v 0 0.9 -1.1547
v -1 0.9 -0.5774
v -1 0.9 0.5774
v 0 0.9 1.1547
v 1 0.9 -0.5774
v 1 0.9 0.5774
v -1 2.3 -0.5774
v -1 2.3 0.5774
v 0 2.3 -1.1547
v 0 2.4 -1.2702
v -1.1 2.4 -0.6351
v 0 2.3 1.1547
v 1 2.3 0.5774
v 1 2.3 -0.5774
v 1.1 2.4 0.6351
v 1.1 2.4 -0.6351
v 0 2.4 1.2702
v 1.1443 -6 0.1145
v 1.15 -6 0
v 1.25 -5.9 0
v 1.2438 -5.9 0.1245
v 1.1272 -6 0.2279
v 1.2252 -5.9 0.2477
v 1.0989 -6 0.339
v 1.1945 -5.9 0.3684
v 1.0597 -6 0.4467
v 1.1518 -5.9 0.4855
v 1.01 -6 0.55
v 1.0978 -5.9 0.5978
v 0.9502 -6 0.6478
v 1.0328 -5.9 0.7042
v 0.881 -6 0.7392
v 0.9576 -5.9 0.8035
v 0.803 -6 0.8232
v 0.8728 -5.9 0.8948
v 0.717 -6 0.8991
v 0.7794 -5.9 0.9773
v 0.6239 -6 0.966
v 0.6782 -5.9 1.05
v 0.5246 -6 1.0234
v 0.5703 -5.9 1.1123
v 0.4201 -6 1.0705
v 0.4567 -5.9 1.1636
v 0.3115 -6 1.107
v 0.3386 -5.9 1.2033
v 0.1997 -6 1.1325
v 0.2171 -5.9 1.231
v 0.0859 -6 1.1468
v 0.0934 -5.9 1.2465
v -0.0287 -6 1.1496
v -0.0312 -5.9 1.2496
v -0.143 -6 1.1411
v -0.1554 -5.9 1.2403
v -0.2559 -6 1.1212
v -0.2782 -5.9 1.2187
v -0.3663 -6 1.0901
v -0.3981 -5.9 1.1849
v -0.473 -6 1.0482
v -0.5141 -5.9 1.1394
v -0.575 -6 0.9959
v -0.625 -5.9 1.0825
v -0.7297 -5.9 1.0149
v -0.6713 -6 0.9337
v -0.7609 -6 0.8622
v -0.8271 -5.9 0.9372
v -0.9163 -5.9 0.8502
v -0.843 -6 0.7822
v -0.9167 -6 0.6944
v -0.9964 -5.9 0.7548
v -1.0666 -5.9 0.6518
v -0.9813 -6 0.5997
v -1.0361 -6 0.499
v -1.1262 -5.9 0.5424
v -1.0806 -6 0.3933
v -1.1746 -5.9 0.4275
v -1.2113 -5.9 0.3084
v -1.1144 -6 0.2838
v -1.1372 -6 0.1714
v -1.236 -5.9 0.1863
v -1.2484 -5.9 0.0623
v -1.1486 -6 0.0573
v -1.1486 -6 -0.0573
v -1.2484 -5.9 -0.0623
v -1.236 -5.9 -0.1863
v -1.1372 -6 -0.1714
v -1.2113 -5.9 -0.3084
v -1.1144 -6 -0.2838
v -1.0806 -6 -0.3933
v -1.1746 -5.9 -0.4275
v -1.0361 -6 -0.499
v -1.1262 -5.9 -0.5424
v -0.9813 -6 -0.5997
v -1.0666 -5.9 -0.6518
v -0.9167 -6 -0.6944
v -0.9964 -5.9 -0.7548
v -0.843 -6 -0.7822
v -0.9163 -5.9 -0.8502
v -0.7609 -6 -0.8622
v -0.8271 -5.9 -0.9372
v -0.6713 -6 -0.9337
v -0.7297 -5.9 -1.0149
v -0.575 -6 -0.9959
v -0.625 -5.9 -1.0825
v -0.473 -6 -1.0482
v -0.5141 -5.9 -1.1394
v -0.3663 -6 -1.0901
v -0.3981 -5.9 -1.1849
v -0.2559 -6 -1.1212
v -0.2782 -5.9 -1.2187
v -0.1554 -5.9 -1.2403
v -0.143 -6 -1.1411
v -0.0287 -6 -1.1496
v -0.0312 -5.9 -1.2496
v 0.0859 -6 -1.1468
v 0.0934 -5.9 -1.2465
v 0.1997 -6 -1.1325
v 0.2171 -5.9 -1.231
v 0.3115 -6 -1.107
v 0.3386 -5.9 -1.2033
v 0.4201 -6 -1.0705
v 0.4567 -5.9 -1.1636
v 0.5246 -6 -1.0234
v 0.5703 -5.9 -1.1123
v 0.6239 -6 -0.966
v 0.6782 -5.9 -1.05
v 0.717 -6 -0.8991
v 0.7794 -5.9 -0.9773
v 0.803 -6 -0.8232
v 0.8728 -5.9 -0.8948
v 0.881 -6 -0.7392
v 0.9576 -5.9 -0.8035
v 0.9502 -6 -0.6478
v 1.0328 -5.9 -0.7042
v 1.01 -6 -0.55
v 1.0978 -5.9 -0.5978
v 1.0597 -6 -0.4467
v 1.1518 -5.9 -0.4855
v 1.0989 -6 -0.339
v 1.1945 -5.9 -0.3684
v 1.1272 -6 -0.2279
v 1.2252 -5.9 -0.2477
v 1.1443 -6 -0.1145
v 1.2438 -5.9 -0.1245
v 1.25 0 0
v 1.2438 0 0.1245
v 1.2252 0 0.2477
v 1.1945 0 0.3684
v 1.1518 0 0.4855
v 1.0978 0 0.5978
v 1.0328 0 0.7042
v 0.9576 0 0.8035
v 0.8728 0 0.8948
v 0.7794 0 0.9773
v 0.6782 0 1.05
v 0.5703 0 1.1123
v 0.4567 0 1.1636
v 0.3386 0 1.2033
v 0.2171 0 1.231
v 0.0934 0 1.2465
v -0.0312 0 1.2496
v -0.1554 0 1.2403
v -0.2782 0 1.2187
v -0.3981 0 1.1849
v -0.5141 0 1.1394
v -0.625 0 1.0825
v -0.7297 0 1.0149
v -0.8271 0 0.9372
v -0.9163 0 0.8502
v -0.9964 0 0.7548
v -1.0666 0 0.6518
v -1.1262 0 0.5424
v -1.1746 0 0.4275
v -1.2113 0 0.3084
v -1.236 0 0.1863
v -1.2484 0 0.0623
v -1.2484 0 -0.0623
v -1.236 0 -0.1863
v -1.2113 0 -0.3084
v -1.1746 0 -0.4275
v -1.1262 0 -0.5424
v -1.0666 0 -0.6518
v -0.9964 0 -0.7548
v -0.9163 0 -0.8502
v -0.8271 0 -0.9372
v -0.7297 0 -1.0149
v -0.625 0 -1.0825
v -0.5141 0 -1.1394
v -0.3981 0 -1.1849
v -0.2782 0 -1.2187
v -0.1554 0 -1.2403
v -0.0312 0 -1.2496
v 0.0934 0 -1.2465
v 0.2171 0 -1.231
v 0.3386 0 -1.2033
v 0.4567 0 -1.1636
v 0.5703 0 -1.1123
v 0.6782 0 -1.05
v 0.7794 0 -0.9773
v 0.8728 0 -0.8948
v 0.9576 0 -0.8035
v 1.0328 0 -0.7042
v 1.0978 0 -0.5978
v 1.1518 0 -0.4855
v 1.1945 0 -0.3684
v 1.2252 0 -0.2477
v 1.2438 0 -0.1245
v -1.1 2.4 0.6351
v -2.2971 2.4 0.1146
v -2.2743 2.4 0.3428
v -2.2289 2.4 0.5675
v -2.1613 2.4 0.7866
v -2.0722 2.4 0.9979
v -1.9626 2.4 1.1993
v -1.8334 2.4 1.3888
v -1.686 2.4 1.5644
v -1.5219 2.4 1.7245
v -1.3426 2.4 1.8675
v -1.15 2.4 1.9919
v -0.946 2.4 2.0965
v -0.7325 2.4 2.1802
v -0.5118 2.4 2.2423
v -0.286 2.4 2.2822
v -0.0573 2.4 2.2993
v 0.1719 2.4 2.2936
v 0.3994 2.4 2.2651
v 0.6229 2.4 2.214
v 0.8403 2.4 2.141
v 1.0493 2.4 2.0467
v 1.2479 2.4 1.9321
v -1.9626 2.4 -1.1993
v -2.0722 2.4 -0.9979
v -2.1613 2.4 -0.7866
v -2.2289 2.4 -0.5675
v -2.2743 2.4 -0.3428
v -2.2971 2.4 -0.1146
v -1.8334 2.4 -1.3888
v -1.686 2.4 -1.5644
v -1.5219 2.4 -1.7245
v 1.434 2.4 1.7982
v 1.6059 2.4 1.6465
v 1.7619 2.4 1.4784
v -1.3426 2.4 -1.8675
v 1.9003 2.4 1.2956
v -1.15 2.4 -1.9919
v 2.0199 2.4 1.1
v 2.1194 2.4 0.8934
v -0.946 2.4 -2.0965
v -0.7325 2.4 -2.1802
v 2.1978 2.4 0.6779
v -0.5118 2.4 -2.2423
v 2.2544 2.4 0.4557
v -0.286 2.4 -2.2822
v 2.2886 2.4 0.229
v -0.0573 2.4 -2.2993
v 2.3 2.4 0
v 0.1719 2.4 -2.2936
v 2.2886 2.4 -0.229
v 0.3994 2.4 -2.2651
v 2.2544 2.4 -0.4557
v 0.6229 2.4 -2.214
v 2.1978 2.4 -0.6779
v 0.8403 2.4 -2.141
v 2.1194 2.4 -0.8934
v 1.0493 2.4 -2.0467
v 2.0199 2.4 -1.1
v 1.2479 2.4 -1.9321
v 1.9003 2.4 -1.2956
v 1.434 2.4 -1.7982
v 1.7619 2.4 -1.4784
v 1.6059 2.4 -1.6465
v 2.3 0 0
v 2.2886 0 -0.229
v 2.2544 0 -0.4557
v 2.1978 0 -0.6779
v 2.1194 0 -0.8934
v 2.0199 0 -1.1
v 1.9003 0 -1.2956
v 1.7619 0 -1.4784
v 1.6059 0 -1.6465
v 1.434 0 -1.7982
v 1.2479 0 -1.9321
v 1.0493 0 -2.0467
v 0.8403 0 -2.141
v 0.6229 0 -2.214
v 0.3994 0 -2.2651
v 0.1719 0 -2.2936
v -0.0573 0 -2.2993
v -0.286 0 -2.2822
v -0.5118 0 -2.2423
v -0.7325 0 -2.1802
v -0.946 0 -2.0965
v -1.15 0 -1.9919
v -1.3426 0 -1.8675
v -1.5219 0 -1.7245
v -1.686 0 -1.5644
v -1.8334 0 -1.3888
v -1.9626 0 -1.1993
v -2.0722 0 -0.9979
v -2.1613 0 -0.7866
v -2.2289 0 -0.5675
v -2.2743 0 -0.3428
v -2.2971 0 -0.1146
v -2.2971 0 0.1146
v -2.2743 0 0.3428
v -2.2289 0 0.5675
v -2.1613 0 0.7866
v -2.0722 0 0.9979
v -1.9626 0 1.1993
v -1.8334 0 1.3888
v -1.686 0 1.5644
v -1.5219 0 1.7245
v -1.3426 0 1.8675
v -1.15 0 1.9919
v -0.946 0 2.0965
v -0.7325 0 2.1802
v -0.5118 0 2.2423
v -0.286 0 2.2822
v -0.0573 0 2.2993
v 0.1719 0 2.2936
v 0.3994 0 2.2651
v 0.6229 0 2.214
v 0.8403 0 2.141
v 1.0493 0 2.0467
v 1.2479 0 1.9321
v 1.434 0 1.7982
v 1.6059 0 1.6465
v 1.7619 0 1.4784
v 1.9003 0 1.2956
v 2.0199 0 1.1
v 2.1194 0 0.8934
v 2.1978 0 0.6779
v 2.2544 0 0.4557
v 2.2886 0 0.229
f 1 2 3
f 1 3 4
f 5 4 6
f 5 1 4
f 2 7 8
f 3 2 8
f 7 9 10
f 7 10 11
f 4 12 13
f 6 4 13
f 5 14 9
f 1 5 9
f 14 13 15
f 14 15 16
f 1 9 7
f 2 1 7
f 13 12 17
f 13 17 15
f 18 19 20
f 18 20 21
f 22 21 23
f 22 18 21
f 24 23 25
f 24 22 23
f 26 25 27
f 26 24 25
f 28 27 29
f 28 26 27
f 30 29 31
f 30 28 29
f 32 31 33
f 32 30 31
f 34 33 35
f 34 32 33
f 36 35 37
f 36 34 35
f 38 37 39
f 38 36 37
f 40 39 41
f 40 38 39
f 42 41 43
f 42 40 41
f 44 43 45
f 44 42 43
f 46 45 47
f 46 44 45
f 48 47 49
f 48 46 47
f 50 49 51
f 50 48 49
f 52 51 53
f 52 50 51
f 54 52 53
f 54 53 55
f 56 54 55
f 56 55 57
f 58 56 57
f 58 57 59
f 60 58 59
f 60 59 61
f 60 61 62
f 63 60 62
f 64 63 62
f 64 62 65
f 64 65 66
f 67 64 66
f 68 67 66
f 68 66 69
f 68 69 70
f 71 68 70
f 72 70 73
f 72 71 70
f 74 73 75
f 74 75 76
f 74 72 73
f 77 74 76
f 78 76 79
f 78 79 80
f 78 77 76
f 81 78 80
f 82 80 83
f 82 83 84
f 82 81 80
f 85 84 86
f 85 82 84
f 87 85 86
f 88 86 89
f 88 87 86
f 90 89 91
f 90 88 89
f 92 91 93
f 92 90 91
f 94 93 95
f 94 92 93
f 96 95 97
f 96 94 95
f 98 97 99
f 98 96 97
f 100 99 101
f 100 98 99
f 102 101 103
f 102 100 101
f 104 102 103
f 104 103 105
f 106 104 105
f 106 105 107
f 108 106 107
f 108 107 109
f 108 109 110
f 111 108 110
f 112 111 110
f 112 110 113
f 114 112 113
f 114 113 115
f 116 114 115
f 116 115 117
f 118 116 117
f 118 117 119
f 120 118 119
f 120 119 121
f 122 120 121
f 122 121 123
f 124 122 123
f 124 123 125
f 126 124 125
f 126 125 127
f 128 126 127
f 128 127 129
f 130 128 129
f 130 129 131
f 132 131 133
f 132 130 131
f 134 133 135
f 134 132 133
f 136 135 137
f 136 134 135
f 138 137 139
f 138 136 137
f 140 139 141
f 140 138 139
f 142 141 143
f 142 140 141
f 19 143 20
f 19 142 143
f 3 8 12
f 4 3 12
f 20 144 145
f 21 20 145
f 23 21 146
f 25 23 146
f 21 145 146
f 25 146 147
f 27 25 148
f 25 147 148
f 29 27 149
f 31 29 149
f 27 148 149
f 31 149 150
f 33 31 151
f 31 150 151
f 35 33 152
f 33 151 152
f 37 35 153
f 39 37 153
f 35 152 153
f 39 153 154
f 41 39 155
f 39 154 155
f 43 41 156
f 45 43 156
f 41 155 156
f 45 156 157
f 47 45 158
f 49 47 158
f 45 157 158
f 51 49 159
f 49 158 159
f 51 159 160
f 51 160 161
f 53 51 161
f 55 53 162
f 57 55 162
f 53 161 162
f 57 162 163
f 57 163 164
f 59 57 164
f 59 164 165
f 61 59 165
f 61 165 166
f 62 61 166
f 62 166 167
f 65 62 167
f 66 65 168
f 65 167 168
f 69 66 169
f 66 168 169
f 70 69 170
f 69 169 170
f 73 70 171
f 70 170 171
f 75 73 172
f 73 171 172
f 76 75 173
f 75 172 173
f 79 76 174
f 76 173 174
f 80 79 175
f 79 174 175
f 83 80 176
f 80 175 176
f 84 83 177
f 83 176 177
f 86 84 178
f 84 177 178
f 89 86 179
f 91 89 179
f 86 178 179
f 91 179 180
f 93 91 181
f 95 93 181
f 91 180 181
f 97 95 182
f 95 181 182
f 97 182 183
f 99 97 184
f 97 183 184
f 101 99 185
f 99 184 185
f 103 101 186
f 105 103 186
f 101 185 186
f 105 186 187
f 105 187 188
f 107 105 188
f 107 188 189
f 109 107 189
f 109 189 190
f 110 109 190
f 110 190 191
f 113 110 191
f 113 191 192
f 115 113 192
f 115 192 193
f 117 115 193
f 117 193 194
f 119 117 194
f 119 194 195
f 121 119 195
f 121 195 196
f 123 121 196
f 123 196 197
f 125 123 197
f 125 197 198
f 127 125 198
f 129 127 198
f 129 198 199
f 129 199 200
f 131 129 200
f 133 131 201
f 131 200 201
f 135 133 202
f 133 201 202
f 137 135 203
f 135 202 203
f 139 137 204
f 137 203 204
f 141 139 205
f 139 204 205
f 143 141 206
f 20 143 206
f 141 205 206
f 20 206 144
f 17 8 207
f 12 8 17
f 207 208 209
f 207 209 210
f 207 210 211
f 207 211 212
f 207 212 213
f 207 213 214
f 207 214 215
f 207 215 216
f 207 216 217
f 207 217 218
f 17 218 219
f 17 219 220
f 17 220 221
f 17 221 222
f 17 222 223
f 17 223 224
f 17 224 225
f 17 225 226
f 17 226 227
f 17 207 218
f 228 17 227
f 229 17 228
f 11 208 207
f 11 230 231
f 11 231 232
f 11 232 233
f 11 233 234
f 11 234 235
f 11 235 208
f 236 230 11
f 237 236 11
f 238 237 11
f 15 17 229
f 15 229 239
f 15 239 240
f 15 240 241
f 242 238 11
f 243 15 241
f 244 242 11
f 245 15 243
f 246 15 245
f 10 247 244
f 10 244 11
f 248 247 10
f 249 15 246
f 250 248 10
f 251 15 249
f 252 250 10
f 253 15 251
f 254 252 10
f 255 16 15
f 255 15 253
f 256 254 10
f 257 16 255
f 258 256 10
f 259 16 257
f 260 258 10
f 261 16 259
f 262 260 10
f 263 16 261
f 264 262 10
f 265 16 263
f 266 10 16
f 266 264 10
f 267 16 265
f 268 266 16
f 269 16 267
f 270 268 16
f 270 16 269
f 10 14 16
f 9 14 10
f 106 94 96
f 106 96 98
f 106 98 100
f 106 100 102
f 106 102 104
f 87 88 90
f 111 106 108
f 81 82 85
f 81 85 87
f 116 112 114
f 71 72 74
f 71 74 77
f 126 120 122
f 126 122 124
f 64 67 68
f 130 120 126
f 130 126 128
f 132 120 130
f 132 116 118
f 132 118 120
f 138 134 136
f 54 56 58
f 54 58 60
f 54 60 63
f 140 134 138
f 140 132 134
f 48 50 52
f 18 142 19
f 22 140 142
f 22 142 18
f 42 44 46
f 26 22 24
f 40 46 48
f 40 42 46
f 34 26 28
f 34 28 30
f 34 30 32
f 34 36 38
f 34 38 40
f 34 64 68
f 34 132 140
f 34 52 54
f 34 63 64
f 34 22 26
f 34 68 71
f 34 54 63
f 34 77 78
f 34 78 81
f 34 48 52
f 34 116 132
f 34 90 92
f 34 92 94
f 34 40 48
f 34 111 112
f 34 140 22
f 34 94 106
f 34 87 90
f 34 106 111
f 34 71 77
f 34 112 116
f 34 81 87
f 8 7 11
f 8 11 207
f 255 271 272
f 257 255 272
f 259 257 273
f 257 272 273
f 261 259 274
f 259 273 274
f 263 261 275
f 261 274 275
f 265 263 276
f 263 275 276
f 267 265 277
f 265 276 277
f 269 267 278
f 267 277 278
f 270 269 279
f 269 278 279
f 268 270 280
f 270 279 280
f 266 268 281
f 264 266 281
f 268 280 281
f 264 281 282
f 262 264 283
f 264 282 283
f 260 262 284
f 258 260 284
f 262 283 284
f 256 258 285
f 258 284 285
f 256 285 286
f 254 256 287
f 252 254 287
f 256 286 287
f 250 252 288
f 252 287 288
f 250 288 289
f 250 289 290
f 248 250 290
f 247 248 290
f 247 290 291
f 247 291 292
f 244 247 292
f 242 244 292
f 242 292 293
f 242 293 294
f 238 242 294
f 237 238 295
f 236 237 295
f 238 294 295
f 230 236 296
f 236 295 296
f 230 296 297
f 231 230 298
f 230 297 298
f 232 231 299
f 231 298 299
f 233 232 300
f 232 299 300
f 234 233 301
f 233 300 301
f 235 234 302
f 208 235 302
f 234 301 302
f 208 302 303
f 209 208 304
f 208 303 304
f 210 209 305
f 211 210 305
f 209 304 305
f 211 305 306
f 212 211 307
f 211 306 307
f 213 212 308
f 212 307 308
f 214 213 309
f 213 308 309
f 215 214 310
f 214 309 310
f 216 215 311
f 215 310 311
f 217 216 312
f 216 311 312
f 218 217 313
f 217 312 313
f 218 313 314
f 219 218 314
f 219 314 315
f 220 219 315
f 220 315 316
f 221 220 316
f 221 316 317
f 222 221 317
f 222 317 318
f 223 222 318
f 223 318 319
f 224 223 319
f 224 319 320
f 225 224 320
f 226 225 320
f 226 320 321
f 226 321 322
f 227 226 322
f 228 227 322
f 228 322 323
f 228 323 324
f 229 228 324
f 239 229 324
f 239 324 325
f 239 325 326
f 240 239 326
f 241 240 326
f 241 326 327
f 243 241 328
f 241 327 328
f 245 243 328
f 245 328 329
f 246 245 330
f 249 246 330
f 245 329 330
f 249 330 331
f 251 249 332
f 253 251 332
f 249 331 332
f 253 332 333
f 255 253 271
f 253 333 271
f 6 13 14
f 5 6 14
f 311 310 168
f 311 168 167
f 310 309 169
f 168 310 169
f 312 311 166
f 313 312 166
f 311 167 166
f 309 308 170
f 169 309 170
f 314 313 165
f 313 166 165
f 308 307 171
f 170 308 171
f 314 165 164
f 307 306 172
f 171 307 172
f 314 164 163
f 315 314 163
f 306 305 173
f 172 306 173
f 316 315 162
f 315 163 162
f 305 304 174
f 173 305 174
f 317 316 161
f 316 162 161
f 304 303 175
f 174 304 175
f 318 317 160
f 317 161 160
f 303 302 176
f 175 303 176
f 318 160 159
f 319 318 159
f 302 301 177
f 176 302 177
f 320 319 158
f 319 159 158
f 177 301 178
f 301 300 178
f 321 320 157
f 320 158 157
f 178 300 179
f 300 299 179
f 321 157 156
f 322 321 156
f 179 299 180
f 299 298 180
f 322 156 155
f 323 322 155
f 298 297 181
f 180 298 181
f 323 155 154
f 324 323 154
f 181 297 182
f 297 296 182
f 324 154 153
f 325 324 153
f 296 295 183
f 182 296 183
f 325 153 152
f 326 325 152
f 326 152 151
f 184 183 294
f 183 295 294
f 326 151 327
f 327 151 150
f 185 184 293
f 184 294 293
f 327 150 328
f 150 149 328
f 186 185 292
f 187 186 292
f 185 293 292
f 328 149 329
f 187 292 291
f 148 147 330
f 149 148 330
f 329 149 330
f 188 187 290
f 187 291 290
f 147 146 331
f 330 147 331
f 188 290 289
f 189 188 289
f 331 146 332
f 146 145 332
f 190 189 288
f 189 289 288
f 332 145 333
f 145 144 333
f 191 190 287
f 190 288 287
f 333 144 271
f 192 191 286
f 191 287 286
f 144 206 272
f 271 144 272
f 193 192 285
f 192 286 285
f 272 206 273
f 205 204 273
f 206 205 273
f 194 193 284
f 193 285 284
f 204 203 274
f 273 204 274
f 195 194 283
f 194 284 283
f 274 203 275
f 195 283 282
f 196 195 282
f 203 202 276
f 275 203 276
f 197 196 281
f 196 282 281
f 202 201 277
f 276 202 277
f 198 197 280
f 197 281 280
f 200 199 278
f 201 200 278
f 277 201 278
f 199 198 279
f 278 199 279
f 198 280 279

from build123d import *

# Parameters (mm, degrees)
SKETCH_1_R          = 2.3
EXTRUDE_1_DEPTH     = 2.4
CUT_EXTRUDE_1_DEPTH = 1.5
SKETCH_3_R          = 1.25
EXTRUDE_2_DEPTH     = 6
CHAMFER_1_SIZE      = 0.1


with BuildPart() as part:
    # 草图1 → 凸台-拉伸1 (new body)
    with BuildSketch(Plane(origin=(0, 0, 0), x_dir=(1, 0, 0), z_dir=(0, 1, 0))):
        Circle(SKETCH_1_R)
    extrude(amount=EXTRUDE_1_DEPTH)

    # 草图2 → 切除-拉伸1 (cut)
    with BuildSketch(Plane(origin=(0, 2.4, 0), x_dir=(1, 0, 0), z_dir=(0, 1, 0))):
        Polygon((0, -1.154700538), (1, -0.577350269), (1, 0.577350269), (0, 1.154700538), (-1, 0.577350269), (-1, -0.577350269), align=None)
    extrude(amount=-CUT_EXTRUDE_1_DEPTH, mode=Mode.SUBTRACT)

    # 草图3 → 凸台-拉伸2 (add)
    with BuildSketch(Plane.XZ):
        Circle(SKETCH_3_R)
    extrude(amount=EXTRUDE_2_DEPTH)

    # 倒角1
    chamfer_1_edges = [part.edges().sort_by_distance(p)[0] for p in [
        (-0.5, 2.4, 0.866025404),
        (0.5, 2.4, 0.866025404),
        (1, 2.4, 0),
        (0.5, 2.4, -0.866025404),
        (-0.5, 2.4, -0.866025404),
        (-1, 2.4, 0),
        (-1.25, -6, 0),
    ]]
    chamfer(chamfer_1_edges, length=CHAMFER_1_SIZE)


solid = part.part
